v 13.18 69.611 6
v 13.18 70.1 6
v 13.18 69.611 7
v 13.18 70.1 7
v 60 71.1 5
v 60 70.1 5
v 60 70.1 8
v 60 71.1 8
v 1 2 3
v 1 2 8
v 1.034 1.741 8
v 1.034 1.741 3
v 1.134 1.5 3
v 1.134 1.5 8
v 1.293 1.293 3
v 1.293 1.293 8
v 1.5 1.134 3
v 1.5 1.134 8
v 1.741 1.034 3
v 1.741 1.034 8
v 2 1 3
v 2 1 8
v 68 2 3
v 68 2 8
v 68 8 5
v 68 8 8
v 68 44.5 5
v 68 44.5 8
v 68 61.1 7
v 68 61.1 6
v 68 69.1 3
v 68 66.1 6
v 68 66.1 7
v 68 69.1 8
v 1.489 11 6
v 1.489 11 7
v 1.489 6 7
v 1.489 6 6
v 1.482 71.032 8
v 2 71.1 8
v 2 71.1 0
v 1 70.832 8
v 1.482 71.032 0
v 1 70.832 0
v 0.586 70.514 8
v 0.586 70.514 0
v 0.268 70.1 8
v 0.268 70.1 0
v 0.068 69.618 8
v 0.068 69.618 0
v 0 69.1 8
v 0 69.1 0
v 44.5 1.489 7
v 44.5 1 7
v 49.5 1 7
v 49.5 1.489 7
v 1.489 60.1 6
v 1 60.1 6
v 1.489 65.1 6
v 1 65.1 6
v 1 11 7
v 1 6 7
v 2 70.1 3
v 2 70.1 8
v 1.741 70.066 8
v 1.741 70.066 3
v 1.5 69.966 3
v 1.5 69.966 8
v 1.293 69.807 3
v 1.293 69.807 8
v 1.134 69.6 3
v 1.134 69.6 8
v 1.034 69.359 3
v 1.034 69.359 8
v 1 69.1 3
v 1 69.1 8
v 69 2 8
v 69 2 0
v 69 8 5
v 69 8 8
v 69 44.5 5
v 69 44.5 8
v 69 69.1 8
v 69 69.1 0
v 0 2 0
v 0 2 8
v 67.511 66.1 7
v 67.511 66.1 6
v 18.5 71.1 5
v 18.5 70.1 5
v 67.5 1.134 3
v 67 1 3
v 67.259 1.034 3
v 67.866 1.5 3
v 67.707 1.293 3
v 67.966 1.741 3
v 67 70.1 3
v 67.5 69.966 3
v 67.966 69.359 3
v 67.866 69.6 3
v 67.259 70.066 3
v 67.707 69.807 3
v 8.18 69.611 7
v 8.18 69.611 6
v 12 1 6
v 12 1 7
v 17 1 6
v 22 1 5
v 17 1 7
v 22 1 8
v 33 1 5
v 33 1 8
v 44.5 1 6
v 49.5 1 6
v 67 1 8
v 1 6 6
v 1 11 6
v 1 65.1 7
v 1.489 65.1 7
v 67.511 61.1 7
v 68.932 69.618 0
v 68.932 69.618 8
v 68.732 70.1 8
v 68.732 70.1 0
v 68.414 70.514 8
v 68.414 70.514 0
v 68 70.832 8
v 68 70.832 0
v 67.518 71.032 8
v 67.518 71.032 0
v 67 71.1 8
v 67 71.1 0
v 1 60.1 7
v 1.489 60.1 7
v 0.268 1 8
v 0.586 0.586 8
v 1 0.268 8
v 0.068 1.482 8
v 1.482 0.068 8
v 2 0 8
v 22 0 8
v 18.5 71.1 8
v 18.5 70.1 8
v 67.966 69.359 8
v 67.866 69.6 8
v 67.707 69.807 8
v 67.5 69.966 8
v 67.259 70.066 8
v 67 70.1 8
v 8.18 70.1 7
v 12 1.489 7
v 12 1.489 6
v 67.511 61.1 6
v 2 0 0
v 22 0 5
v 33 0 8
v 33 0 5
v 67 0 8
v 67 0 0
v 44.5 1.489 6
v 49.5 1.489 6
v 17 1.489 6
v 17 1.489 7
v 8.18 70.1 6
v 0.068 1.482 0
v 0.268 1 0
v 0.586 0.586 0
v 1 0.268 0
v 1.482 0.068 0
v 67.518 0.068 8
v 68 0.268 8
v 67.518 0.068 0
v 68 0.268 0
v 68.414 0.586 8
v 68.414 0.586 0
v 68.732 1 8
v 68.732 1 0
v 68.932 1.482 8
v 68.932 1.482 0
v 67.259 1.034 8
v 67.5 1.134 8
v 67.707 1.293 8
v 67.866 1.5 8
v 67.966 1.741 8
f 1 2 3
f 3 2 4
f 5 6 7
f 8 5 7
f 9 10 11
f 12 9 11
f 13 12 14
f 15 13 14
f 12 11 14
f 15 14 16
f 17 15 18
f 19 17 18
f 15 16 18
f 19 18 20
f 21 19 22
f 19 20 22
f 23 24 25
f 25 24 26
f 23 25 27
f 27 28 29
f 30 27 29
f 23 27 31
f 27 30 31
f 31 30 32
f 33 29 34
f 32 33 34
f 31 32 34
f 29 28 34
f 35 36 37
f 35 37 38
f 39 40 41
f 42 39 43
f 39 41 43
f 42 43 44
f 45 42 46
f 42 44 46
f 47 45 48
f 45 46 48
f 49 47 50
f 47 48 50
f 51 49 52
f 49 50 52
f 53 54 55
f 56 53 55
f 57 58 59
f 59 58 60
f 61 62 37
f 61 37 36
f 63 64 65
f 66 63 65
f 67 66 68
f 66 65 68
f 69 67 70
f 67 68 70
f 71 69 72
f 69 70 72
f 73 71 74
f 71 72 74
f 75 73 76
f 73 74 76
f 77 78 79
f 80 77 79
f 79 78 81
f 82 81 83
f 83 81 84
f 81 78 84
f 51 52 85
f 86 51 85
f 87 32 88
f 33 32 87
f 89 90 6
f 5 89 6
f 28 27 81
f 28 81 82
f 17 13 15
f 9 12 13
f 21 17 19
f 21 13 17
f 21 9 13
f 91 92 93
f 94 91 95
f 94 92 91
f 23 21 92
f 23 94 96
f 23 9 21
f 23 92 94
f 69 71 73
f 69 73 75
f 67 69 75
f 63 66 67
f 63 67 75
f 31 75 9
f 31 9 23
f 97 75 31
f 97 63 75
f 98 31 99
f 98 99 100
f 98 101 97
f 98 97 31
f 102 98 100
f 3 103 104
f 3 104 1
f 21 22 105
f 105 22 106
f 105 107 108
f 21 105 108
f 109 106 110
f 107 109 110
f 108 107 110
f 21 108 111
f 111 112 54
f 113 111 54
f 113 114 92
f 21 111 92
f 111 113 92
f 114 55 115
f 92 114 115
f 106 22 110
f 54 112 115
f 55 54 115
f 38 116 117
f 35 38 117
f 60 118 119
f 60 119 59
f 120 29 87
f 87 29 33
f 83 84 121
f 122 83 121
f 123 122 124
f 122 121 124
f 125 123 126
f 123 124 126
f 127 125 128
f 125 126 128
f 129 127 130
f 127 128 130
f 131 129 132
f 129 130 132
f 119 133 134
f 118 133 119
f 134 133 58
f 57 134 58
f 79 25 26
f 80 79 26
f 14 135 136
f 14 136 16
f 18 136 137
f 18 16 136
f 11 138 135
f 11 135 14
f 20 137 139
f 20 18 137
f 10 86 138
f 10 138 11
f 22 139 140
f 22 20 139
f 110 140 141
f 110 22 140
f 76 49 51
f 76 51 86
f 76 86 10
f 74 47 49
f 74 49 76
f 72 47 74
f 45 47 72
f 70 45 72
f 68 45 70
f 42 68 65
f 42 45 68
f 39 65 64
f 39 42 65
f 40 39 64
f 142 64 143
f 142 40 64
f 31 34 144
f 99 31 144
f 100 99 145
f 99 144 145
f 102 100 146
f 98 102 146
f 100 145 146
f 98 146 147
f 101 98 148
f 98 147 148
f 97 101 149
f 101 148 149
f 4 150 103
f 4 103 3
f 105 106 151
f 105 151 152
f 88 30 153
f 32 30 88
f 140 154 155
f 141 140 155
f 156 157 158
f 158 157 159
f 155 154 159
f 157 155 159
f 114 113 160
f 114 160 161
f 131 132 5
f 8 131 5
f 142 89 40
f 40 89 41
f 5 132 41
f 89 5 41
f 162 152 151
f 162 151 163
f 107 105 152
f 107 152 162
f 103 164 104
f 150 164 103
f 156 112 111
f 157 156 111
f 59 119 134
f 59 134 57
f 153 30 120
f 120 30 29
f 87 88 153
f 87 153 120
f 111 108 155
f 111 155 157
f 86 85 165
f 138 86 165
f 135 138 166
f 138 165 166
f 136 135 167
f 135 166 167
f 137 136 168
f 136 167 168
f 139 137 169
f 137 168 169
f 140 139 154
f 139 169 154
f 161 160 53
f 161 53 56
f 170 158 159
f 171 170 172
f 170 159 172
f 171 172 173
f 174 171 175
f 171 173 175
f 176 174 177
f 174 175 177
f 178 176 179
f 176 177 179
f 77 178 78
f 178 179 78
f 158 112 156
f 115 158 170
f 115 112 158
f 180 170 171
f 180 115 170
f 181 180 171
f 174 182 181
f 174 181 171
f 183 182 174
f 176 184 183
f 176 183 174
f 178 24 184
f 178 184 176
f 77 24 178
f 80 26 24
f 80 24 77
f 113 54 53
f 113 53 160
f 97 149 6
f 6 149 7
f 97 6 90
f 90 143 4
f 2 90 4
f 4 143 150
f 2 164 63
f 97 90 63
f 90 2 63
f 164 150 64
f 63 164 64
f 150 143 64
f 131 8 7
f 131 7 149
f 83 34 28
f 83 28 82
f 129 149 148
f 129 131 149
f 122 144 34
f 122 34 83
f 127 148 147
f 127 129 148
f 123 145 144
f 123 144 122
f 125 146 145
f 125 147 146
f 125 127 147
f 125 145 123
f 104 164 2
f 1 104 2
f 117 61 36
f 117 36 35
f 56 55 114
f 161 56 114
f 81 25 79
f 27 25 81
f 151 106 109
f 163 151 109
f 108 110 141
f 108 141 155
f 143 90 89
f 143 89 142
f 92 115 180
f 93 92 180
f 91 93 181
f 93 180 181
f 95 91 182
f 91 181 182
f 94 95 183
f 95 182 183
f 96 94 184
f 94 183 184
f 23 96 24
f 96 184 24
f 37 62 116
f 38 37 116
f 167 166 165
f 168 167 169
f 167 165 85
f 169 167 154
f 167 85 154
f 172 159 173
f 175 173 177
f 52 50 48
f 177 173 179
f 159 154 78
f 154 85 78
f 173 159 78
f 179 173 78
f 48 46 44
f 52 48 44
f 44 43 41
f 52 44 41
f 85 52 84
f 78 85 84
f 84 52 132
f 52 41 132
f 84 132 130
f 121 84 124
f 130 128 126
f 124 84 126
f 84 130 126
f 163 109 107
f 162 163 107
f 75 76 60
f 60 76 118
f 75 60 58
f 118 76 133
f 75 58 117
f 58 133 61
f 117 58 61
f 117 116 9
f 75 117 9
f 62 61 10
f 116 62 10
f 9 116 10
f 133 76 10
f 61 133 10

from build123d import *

# Parameters (mm, degrees)
BOSS_EXTRU_1_DEPTH      = 8
ENL_V_MAT_EXTRU_1_DEPTH = 5
ESQUISSE4_W             = 5
ESQUISSE4_H             = 1
BOSS_EXTRU_3_DEPTH      = 0.48904
ESQUISSE5_W             = 1
ESQUISSE5_H             = 5
BOSS_EXTRU_4_DEPTH      = 0.48904
ESQUISSE6_W             = 1
ESQUISSE6_H             = 5
BOSS_EXTRU_5_DEPTH      = 0.48904
ESQUISSE7_W             = 1
ESQUISSE7_H             = 5
BOSS_EXTRU_6_DEPTH      = 0.48904
ESQUISSE8_W             = 5
ESQUISSE8_H             = 1
BOSS_EXTRU_7_DEPTH      = 0.48904
ESQUISSE9_W             = 5
ESQUISSE9_H             = 1
BOSS_EXTRU_8_DEPTH      = 0.48904
ESQUISSE10_W            = 3
ESQUISSE10_H            = 36.5
ENL_V_MAT_EXTRU_3_DEPTH = 99.707699801
ESQUISSE11_W            = 41.5
ESQUISSE11_H            = 3
ENL_V_MAT_EXTRU_4_DEPTH = 99.686422572
ESQUISSE12_W            = 11
ESQUISSE12_H            = 3
ENL_V_MAT_EXTRU_5_DEPTH = 99.686422572


with BuildPart() as part:
    # Esquisse1 → Boss.-Extru.1 (new body)
    with BuildSketch(Plane.XY):
        with BuildLine():
            Line((2, 0), (67, 0))
            ThreePointArc((67, 0), (68.414213562, 0.585786438), (69, 2))
            Line((69, 2), (69, 69.1))
            ThreePointArc((69, 69.1), (68.414213562, 70.514213562), (67, 71.1))
            Line((67, 71.1), (2, 71.1))
            ThreePointArc((2, 71.1), (0.585786438, 70.514213562), (0, 69.1))
            Line((0, 69.1), (0, 2))
            ThreePointArc((0, 2), (0.585786438, 0.585786438), (2, 0))
        make_face()
    extrude(amount=BOSS_EXTRU_1_DEPTH)

    # Esquisse3 → Enlèv. mat.-Extru.1 (cut)
    with BuildSketch(Plane.XY.offset(8)):
        with BuildLine():
            Line((2, 1), (67, 1))
            ThreePointArc((67, 1), (67.707106781, 1.292893219), (68, 2))
            Line((68, 2), (68, 69.1))
            ThreePointArc((68, 69.1), (67.707106781, 69.807106781), (67, 70.1))
            Line((67, 70.1), (2, 70.1))
            ThreePointArc((2, 70.1), (1.292893219, 69.807106781), (1, 69.1))
            Line((1, 69.1), (1, 2))
            ThreePointArc((1, 2), (1.292893219, 1.292893219), (2, 1))
        make_face()
    extrude(amount=-ENL_V_MAT_EXTRU_1_DEPTH, mode=Mode.SUBTRACT)

    # Esquisse4 → Boss.-Extru.3 (add)
    with BuildSketch(Plane.XZ.offset(-70.1)):
        with Locations((10.679731729, 6.5)):
            Rectangle(ESQUISSE4_W, ESQUISSE4_H)
    extrude(amount=BOSS_EXTRU_3_DEPTH)

    # Esquisse5 → Boss.-Extru.4 (add)
    with BuildSketch(Plane.ZY.offset(-68)):
        with Locations((6.5, 63.6)):
            Rectangle(ESQUISSE5_W, ESQUISSE5_H)
    extrude(amount=BOSS_EXTRU_4_DEPTH)

    # Esquisse6 → Boss.-Extru.5 (add)
    with BuildSketch(Plane(origin=(1, 0, 0), x_dir=(0, 0, -1), z_dir=(1, 0, 0))):
        with Locations((-6.5, 62.6)):
            Rectangle(ESQUISSE6_W, ESQUISSE6_H)
    extrude(amount=BOSS_EXTRU_5_DEPTH)

    # Esquisse7 → Boss.-Extru.6 (add)
    with BuildSketch(Plane(origin=(1, 0, 0), x_dir=(0, 0, -1), z_dir=(1, 0, 0))):
        with Locations((-6.5, 8.5)):
            Rectangle(ESQUISSE7_W, ESQUISSE7_H)
    extrude(amount=BOSS_EXTRU_6_DEPTH)

    # Esquisse8 → Boss.-Extru.7 (add)
    with BuildSketch(Plane(origin=(0, 1, 0), x_dir=(1, 0, 0), z_dir=(0, 1, 0))):
        with Locations((14.5, -6.5)):
            Rectangle(ESQUISSE8_W, ESQUISSE8_H)
    extrude(amount=BOSS_EXTRU_7_DEPTH)

    # Esquisse9 → Boss.-Extru.8 (add)
    with BuildSketch(Plane(origin=(0, 1, 0), x_dir=(1, 0, 0), z_dir=(0, 1, 0))):
        with Locations((47, -6.5)):
            Rectangle(ESQUISSE9_W, ESQUISSE9_H)
    extrude(amount=BOSS_EXTRU_8_DEPTH)

    # Esquisse10 → Enlèv. mat.-Extru.3 (cut, through all)
    with BuildSketch(Plane.ZY.offset(-68)):
        with Locations((6.5, 26.25)):
            Rectangle(ESQUISSE10_W, ESQUISSE10_H)
    extrude(amount=-ENL_V_MAT_EXTRU_3_DEPTH, mode=Mode.SUBTRACT)

    # Esquisse11 → Enlèv. mat.-Extru.4 (cut, through all)
    with BuildSketch(Plane.XZ.offset(-70.1)):
        with Locations((39.25, 6.5)):
            Rectangle(ESQUISSE11_W, ESQUISSE11_H)
    extrude(amount=-ENL_V_MAT_EXTRU_4_DEPTH, mode=Mode.SUBTRACT)

    # Esquisse12 → Enlèv. mat.-Extru.5 (cut, through all)
    with BuildSketch(Plane(origin=(0, 1, 0), x_dir=(1, 0, 0), z_dir=(0, 1, 0))):
        with Locations((27.5, -6.5)):
            Rectangle(ESQUISSE12_W, ESQUISSE12_H)
    extrude(amount=-ENL_V_MAT_EXTRU_5_DEPTH, mode=Mode.SUBTRACT)


solid = part.part
